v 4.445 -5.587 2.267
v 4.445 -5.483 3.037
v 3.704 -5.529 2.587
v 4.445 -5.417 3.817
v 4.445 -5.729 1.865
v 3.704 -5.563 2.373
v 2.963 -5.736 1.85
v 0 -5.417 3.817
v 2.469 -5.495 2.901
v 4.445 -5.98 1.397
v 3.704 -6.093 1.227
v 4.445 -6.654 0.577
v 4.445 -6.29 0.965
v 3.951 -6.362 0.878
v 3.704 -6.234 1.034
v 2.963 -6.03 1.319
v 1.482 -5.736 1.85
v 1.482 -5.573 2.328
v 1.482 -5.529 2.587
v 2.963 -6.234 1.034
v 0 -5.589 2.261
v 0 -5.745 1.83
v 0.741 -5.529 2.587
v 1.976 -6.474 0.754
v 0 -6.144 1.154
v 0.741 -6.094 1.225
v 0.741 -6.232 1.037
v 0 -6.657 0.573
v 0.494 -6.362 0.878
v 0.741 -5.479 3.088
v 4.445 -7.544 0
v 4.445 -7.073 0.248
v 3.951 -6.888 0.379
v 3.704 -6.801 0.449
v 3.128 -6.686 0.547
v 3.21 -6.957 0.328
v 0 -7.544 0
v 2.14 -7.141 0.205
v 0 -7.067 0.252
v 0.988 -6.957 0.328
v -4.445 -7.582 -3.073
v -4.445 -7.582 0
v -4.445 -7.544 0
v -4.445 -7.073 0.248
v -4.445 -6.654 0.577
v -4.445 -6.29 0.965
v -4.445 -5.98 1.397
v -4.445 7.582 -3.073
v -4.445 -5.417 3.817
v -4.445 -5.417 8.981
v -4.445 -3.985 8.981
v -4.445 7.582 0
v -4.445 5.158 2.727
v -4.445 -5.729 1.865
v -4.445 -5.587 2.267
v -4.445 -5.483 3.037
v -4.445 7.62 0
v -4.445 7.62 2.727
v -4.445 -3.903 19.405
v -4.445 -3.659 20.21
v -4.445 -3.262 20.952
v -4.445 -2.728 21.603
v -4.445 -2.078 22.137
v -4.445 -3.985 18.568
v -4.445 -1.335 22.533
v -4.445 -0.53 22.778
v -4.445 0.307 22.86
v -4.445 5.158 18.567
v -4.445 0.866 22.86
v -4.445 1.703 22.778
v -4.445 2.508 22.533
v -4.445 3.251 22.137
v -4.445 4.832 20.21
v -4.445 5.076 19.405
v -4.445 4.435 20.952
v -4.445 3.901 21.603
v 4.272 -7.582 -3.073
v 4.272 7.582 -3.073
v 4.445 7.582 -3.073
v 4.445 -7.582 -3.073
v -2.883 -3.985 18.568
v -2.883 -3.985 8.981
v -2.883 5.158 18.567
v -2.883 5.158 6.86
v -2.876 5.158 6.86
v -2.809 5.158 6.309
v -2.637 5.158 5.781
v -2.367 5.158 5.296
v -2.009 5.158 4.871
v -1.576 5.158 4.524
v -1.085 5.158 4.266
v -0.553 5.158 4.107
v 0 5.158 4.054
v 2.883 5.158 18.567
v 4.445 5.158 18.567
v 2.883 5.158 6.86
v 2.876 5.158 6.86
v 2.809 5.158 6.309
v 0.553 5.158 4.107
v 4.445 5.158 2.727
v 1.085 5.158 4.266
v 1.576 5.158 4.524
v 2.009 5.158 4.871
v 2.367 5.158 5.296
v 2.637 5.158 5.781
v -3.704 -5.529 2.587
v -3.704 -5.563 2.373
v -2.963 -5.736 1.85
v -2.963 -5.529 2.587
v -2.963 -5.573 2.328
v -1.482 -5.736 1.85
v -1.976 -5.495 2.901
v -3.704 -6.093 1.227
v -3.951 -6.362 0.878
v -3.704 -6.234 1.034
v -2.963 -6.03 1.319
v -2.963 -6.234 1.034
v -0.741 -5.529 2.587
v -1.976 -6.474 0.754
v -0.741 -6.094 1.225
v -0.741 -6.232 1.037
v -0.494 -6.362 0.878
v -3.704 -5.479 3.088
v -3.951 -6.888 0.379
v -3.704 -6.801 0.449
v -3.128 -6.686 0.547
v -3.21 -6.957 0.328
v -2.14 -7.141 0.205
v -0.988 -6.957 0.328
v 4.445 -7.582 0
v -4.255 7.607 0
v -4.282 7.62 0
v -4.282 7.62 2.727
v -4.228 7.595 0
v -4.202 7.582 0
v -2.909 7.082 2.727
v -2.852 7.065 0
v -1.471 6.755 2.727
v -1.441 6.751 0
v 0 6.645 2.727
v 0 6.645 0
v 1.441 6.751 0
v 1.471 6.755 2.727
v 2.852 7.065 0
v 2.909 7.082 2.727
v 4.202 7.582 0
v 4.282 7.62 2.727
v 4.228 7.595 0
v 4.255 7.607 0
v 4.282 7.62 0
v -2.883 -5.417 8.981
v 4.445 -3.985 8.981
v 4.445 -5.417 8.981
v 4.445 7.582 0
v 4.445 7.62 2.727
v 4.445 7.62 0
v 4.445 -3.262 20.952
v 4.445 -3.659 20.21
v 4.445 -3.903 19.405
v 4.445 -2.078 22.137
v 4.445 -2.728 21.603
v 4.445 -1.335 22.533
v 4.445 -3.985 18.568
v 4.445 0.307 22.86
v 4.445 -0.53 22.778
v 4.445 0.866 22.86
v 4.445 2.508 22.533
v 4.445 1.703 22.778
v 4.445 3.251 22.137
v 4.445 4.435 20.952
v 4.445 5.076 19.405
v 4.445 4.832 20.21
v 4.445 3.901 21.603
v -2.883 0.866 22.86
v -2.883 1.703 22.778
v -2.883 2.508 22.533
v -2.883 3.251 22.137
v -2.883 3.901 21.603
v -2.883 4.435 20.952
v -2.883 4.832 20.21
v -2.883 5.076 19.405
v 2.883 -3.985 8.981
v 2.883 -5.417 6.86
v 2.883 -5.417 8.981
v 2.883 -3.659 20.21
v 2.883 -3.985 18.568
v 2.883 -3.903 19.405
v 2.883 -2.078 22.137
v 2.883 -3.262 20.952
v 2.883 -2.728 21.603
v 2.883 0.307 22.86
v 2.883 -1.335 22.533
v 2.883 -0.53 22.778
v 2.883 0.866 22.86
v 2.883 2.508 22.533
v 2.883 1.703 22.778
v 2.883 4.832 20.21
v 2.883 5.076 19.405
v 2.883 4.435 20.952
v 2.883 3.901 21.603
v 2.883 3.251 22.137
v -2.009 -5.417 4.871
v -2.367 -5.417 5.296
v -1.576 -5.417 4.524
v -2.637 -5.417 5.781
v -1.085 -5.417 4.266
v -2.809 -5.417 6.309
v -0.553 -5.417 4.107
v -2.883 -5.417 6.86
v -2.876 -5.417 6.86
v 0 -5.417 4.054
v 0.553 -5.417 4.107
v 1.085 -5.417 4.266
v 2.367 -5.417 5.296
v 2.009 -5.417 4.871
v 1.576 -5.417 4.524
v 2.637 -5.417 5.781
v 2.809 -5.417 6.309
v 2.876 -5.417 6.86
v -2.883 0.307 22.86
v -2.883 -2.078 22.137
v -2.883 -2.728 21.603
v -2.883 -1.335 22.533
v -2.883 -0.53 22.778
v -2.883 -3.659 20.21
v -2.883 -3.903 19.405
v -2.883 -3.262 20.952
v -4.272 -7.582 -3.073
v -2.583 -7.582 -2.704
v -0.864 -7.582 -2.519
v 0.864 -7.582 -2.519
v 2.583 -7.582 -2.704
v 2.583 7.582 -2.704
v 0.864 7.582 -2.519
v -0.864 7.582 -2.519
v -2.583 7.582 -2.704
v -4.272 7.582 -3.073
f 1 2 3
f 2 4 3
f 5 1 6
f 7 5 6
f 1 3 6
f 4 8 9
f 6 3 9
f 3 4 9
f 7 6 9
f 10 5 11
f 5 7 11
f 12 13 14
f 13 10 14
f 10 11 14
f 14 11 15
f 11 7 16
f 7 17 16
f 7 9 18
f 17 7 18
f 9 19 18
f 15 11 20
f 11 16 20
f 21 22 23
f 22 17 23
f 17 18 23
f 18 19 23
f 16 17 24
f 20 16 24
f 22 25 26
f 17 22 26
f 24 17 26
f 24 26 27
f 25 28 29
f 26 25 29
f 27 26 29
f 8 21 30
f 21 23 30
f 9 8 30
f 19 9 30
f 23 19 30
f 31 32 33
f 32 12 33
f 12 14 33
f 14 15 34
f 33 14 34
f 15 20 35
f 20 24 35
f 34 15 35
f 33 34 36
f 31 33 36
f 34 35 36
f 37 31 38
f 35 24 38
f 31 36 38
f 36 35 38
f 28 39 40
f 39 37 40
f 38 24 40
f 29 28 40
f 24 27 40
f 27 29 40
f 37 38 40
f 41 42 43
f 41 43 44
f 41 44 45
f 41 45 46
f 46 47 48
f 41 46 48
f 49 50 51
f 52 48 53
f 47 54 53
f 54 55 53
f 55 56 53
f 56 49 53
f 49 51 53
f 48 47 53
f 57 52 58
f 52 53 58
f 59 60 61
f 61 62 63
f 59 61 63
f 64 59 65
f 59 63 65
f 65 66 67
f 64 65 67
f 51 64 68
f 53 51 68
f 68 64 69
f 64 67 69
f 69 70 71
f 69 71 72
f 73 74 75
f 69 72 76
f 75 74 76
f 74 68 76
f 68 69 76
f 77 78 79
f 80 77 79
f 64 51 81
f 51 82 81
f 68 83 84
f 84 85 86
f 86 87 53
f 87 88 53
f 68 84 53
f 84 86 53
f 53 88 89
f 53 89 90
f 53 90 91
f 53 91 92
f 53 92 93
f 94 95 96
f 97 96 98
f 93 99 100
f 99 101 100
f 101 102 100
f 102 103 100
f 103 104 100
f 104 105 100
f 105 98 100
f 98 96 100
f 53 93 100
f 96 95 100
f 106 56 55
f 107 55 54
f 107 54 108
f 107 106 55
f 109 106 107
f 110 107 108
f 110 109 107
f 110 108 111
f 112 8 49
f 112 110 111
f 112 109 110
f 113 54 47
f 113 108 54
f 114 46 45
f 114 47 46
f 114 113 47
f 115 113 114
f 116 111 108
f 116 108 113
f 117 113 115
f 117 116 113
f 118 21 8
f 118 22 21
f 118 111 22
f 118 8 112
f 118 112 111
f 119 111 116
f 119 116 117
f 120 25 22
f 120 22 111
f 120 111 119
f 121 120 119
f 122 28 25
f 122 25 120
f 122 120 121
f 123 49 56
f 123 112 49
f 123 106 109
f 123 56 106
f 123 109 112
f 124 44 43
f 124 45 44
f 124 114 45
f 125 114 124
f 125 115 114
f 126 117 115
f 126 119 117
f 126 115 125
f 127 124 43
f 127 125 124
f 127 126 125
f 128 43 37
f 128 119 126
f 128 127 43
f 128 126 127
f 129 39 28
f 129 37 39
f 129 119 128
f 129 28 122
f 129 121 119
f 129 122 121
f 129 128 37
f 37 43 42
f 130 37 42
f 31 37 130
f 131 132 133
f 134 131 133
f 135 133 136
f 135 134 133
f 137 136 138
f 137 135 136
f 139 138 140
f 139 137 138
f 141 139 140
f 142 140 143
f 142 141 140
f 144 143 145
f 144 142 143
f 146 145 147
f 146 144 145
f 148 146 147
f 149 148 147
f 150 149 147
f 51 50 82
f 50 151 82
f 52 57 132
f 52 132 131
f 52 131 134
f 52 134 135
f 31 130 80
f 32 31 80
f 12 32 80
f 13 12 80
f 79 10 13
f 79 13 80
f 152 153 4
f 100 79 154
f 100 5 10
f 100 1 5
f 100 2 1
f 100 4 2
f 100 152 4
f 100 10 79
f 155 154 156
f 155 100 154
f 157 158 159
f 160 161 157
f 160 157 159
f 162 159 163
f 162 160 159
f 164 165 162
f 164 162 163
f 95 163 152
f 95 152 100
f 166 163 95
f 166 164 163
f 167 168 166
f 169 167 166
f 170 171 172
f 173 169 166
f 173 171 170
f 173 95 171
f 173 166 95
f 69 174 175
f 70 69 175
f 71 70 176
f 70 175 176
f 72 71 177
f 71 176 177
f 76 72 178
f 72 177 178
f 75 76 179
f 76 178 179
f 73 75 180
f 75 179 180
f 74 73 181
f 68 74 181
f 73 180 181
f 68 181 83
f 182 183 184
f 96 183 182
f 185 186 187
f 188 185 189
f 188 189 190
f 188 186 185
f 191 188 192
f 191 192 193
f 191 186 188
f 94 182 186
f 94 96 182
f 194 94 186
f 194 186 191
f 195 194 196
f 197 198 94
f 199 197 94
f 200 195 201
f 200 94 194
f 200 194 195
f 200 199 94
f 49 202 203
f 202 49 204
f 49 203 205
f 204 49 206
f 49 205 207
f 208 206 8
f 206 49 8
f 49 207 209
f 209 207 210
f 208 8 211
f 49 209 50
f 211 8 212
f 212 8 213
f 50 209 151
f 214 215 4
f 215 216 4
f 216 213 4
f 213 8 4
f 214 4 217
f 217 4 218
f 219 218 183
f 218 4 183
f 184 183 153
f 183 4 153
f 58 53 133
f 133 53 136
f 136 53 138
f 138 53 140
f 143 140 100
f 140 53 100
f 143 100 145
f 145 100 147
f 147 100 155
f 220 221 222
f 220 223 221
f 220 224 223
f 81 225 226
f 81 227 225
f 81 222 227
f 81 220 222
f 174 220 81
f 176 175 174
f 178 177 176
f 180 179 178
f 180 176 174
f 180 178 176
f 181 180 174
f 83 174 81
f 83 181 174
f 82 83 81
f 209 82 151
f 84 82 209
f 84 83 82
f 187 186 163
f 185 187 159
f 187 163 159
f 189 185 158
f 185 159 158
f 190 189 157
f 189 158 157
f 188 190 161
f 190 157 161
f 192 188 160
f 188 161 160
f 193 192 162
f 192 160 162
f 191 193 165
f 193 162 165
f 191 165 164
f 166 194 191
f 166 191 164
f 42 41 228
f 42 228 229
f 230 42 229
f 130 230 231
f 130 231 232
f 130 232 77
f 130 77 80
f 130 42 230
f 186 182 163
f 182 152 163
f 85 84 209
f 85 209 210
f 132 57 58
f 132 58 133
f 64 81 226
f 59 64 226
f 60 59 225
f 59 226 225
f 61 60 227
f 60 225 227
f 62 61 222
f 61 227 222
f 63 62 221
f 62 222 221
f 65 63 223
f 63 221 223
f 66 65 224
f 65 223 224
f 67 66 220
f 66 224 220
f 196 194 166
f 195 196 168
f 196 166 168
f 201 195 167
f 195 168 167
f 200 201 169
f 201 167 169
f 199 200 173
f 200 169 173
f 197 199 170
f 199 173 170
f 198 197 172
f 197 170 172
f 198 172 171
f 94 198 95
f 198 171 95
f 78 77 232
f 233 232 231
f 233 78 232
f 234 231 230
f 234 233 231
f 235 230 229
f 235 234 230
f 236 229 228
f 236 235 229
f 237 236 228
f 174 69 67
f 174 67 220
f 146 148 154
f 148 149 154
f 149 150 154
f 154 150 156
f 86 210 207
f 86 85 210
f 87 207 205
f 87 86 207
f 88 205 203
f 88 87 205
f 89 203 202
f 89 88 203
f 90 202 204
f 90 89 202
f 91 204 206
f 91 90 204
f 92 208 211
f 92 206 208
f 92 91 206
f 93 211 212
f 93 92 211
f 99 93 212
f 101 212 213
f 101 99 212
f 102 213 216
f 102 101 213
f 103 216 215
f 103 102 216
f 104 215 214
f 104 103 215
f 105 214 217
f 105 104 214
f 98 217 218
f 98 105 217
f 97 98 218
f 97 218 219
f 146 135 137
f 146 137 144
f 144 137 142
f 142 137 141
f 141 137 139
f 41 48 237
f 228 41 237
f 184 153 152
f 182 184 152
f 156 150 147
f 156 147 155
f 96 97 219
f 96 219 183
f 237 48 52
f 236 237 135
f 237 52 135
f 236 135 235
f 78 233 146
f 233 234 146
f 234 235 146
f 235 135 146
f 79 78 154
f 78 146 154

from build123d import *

# Parameters (mm, degrees)
F0_W           = 8.89
F0_H           = 15.24
F1_DEPTH       = 22.86
F3_DEPTH       = 25.4
F3_DEPTH_BACK  = 25.4
F4_R           = 4.2926
F6_DEPTH       = 25.4
F6_DEPTH_BACK  = 25.4
F7_R           = 4.2924717139
F9_DEPTH       = 25.4
F9_DEPTH_BACK  = 25.4
F10_R          = 9.8901735715
F11_DEPTH      = 48.514
F12_R          = 2.8768000524
F13_DEPTH      = 25.4
F13_DEPTH_BACK = 25.4
F15_DEPTH      = 25.4
F15_DEPTH_BACK = 25.4
F16_W          = 8.89
F16_H          = 15.1638
F17_DEPTH      = 3.0734
F18_R          = 16.0782
F19_DEPTH      = 25.4
F19_DEPTH_BACK = 25.4


with BuildPart() as f1:
    # F0 (on Top) → F1 (new body)
    with BuildSketch(Plane.XY):
        Rectangle(F0_W, F0_H)
    extrude(amount=F1_DEPTH)

    # F2 (on Right) → F3 (cut, two sides)
    with BuildSketch(Plane.YZ) as f3_sk:
        Polygon((7.8410664573, 2.7272452135), (7.8410664573, 0), (12.4911786988, 0), (12.4911786988, 24.5470050722), (5.1583079621, 24.5470050722), (5.1583079621, 2.7272452135), align=None)
    extrude(amount=-F3_DEPTH, mode=Mode.SUBTRACT)
    extrude(f3_sk.sketch, amount=F3_DEPTH_BACK, mode=Mode.SUBTRACT)

    # F4
    f4_edges = [f1.edges().sort_by_distance(p)[0] for p in [
        (0, 5.158308, 22.86),
    ]]
    fillet(f4_edges, radius=F4_R)

    # F5 (on Right) → F6 (cut, two sides)
    with BuildSketch(Plane.YZ) as f6_sk:
        Polygon((-11.5864574909, 8.9812148362), (-9.2614004388, 8.9812148362), (-3.9853109047, 8.9812148362), (-3.9853109047, 24.7200578451), (-11.5864574909, 24.7200578451), align=None)
    extrude(amount=-F6_DEPTH, mode=Mode.SUBTRACT)
    extrude(f6_sk.sketch, amount=F6_DEPTH_BACK, mode=Mode.SUBTRACT)

    # F7
    f7_edges = [f1.edges().sort_by_distance(p)[0] for p in [
        (0, -3.985311, 22.86),
    ]]
    fillet(f7_edges, radius=F7_R)

    # F8 (on Right) → F9 (cut, two sides)
    with BuildSketch(Plane.YZ) as f9_sk:
        with BuildLine():
            Line((-5.4170731455, 3.8172584027), (-5.4170731455, 10.038449429))
            Line((-5.4170731455, 10.038449429), (-13.4461307898, 9.9321035668))
            Line((-13.4461307898, 9.9321035668), (-13.4461307898, 0.467386446))
            add(Edge.make_bspline(
                [(-5.4170731455, 3.8172584027), (-5.523418542, 2.6474618353), (-5.4771876546, 2.0387220808), (-7.508362437, -0.9482839925), (-11.1789391189, -0.0271654713), (-13.4461307898, 0.467386446)],
                knots=[0, 0, 0, 0, 0.2588835968, 0.5538040318, 1, 1, 1, 1], degree=3))
        make_face()
    extrude(amount=-F9_DEPTH, mode=Mode.SUBTRACT)
    extrude(f9_sk.sketch, amount=F9_DEPTH_BACK, mode=Mode.SUBTRACT)

    # F10 (on Top) → F11 (cut)
    with BuildSketch(Plane.XY):
        with Locations((0, 16.5352746844)):
            Circle(F10_R)
    extrude(amount=F11_DEPTH, mode=Mode.SUBTRACT)

    # F12 (on Front) → F13 (cut, two sides)
    with BuildSketch(Plane.XZ) as f13_sk:
        with Locations((0, 6.9304113276)):
            Circle(F12_R)
    extrude(amount=-F13_DEPTH, mode=Mode.SUBTRACT)
    extrude(f13_sk.sketch, amount=F13_DEPTH_BACK, mode=Mode.SUBTRACT)

    # F14 (on Front) → F15 (cut, two sides)
    with BuildSketch(Plane.XZ) as f15_sk:
        Polygon((-2.8829, 6.8600848975), (0, 6.8600848975), (0, 23.8157852443), (-2.8829, 24.1923942218), align=None)
        Polygon((0, 6.8600848975), (2.8829, 6.8600848975), (2.8829, 24.0822033214), (-1.0464692745, 24.0822033214), (0, 23.8157852443), align=None)
    extrude(amount=-F15_DEPTH, mode=Mode.SUBTRACT)
    extrude(f15_sk.sketch, amount=F15_DEPTH_BACK, mode=Mode.SUBTRACT)

    # F16 (on Top) → F17 (join)
    with BuildSketch(Plane.XY):
        Rectangle(F16_W, F16_H)
    extrude(amount=-F17_DEPTH)

    # F18 (on Front) → F19 (cut, two sides)
    with BuildSketch(Plane.XZ) as f19_sk:
        with Locations((0, -18.5737498105)):
            Circle(F18_R)
    extrude(amount=-F19_DEPTH, mode=Mode.SUBTRACT)
    extrude(f19_sk.sketch, amount=F19_DEPTH_BACK, mode=Mode.SUBTRACT)


solid = f1.part
